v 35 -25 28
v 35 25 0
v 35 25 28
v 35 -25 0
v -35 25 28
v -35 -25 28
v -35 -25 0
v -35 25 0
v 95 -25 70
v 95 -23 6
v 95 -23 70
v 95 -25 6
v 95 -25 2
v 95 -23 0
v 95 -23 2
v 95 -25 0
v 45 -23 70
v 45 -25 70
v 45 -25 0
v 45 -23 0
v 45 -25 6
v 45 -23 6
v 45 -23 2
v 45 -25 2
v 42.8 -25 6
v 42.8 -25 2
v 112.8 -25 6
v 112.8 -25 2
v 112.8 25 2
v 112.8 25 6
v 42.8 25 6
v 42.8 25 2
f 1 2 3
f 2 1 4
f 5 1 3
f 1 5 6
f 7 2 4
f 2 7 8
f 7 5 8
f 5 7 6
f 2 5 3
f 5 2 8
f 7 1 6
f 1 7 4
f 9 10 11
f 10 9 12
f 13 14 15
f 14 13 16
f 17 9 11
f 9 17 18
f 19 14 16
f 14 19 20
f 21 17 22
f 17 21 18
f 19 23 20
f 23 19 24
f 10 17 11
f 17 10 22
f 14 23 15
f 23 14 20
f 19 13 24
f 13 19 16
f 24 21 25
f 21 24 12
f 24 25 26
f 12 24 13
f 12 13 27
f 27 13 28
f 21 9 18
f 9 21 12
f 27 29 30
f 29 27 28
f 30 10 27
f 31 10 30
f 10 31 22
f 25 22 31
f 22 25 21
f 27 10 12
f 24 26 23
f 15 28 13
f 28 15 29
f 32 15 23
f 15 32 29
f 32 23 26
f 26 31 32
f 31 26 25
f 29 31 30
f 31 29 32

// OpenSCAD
// Two-part enclosure for a small electronics board (e.g. Arduino-based temperature logger)
// Print orientation: both parts rest on the bed (z = 0), side by side, with a 10 mm gap.

// ---------------- Parameters ----------------
box_x      = 70;    // box outer length (X)
box_y      = 50;    // box outer width (Y)
box_z      = 30;    // box height (Z)
box_wall   = 2;     // box wall thickness
box_floor  = 2;     // box floor thickness

lid_t      = 2;     // lid plate thickness
lip_t      = 1.5;   // lip wall thickness
lip_h      = 4;     // lip height
lip_x      = 65.6;  // lip outer length (X)
lip_y      = 45.6;  // lip outer width (Y)
lip_over_x = (box_x - lip_x) / 2; // lip overhang on X (0.2 mm clearance side)
lip_over_y = (box_y - lip_y) / 2; // lip overhang on Y (0.2 mm clearance side)

gap        = 10;    // gap between the two parts

$fn = 64;

// ---------------- Model ----------------
union() {
    // Part 1: box (open top)
    translate([-box_x / 2, -box_y / 2, 0])
        cube([box_x, box_y, box_z - box_floor]);

    // Part 2: lid (printed upside down: plate + overhanging lip)
    translate([box_x / 2 + gap, -box_y / 2, 0])
        cube([box_y, lid_t, lip_x + 2 * lip_over_x]); // plate under the lip

    translate([box_x / 2 + gap - lip_over_x, -box_y / 2, lid_t])
        cube([lip_x + 2 * lip_over_x, lip_y + 2 * lip_over_y, lip_h]); // lip on top of the plate
}
